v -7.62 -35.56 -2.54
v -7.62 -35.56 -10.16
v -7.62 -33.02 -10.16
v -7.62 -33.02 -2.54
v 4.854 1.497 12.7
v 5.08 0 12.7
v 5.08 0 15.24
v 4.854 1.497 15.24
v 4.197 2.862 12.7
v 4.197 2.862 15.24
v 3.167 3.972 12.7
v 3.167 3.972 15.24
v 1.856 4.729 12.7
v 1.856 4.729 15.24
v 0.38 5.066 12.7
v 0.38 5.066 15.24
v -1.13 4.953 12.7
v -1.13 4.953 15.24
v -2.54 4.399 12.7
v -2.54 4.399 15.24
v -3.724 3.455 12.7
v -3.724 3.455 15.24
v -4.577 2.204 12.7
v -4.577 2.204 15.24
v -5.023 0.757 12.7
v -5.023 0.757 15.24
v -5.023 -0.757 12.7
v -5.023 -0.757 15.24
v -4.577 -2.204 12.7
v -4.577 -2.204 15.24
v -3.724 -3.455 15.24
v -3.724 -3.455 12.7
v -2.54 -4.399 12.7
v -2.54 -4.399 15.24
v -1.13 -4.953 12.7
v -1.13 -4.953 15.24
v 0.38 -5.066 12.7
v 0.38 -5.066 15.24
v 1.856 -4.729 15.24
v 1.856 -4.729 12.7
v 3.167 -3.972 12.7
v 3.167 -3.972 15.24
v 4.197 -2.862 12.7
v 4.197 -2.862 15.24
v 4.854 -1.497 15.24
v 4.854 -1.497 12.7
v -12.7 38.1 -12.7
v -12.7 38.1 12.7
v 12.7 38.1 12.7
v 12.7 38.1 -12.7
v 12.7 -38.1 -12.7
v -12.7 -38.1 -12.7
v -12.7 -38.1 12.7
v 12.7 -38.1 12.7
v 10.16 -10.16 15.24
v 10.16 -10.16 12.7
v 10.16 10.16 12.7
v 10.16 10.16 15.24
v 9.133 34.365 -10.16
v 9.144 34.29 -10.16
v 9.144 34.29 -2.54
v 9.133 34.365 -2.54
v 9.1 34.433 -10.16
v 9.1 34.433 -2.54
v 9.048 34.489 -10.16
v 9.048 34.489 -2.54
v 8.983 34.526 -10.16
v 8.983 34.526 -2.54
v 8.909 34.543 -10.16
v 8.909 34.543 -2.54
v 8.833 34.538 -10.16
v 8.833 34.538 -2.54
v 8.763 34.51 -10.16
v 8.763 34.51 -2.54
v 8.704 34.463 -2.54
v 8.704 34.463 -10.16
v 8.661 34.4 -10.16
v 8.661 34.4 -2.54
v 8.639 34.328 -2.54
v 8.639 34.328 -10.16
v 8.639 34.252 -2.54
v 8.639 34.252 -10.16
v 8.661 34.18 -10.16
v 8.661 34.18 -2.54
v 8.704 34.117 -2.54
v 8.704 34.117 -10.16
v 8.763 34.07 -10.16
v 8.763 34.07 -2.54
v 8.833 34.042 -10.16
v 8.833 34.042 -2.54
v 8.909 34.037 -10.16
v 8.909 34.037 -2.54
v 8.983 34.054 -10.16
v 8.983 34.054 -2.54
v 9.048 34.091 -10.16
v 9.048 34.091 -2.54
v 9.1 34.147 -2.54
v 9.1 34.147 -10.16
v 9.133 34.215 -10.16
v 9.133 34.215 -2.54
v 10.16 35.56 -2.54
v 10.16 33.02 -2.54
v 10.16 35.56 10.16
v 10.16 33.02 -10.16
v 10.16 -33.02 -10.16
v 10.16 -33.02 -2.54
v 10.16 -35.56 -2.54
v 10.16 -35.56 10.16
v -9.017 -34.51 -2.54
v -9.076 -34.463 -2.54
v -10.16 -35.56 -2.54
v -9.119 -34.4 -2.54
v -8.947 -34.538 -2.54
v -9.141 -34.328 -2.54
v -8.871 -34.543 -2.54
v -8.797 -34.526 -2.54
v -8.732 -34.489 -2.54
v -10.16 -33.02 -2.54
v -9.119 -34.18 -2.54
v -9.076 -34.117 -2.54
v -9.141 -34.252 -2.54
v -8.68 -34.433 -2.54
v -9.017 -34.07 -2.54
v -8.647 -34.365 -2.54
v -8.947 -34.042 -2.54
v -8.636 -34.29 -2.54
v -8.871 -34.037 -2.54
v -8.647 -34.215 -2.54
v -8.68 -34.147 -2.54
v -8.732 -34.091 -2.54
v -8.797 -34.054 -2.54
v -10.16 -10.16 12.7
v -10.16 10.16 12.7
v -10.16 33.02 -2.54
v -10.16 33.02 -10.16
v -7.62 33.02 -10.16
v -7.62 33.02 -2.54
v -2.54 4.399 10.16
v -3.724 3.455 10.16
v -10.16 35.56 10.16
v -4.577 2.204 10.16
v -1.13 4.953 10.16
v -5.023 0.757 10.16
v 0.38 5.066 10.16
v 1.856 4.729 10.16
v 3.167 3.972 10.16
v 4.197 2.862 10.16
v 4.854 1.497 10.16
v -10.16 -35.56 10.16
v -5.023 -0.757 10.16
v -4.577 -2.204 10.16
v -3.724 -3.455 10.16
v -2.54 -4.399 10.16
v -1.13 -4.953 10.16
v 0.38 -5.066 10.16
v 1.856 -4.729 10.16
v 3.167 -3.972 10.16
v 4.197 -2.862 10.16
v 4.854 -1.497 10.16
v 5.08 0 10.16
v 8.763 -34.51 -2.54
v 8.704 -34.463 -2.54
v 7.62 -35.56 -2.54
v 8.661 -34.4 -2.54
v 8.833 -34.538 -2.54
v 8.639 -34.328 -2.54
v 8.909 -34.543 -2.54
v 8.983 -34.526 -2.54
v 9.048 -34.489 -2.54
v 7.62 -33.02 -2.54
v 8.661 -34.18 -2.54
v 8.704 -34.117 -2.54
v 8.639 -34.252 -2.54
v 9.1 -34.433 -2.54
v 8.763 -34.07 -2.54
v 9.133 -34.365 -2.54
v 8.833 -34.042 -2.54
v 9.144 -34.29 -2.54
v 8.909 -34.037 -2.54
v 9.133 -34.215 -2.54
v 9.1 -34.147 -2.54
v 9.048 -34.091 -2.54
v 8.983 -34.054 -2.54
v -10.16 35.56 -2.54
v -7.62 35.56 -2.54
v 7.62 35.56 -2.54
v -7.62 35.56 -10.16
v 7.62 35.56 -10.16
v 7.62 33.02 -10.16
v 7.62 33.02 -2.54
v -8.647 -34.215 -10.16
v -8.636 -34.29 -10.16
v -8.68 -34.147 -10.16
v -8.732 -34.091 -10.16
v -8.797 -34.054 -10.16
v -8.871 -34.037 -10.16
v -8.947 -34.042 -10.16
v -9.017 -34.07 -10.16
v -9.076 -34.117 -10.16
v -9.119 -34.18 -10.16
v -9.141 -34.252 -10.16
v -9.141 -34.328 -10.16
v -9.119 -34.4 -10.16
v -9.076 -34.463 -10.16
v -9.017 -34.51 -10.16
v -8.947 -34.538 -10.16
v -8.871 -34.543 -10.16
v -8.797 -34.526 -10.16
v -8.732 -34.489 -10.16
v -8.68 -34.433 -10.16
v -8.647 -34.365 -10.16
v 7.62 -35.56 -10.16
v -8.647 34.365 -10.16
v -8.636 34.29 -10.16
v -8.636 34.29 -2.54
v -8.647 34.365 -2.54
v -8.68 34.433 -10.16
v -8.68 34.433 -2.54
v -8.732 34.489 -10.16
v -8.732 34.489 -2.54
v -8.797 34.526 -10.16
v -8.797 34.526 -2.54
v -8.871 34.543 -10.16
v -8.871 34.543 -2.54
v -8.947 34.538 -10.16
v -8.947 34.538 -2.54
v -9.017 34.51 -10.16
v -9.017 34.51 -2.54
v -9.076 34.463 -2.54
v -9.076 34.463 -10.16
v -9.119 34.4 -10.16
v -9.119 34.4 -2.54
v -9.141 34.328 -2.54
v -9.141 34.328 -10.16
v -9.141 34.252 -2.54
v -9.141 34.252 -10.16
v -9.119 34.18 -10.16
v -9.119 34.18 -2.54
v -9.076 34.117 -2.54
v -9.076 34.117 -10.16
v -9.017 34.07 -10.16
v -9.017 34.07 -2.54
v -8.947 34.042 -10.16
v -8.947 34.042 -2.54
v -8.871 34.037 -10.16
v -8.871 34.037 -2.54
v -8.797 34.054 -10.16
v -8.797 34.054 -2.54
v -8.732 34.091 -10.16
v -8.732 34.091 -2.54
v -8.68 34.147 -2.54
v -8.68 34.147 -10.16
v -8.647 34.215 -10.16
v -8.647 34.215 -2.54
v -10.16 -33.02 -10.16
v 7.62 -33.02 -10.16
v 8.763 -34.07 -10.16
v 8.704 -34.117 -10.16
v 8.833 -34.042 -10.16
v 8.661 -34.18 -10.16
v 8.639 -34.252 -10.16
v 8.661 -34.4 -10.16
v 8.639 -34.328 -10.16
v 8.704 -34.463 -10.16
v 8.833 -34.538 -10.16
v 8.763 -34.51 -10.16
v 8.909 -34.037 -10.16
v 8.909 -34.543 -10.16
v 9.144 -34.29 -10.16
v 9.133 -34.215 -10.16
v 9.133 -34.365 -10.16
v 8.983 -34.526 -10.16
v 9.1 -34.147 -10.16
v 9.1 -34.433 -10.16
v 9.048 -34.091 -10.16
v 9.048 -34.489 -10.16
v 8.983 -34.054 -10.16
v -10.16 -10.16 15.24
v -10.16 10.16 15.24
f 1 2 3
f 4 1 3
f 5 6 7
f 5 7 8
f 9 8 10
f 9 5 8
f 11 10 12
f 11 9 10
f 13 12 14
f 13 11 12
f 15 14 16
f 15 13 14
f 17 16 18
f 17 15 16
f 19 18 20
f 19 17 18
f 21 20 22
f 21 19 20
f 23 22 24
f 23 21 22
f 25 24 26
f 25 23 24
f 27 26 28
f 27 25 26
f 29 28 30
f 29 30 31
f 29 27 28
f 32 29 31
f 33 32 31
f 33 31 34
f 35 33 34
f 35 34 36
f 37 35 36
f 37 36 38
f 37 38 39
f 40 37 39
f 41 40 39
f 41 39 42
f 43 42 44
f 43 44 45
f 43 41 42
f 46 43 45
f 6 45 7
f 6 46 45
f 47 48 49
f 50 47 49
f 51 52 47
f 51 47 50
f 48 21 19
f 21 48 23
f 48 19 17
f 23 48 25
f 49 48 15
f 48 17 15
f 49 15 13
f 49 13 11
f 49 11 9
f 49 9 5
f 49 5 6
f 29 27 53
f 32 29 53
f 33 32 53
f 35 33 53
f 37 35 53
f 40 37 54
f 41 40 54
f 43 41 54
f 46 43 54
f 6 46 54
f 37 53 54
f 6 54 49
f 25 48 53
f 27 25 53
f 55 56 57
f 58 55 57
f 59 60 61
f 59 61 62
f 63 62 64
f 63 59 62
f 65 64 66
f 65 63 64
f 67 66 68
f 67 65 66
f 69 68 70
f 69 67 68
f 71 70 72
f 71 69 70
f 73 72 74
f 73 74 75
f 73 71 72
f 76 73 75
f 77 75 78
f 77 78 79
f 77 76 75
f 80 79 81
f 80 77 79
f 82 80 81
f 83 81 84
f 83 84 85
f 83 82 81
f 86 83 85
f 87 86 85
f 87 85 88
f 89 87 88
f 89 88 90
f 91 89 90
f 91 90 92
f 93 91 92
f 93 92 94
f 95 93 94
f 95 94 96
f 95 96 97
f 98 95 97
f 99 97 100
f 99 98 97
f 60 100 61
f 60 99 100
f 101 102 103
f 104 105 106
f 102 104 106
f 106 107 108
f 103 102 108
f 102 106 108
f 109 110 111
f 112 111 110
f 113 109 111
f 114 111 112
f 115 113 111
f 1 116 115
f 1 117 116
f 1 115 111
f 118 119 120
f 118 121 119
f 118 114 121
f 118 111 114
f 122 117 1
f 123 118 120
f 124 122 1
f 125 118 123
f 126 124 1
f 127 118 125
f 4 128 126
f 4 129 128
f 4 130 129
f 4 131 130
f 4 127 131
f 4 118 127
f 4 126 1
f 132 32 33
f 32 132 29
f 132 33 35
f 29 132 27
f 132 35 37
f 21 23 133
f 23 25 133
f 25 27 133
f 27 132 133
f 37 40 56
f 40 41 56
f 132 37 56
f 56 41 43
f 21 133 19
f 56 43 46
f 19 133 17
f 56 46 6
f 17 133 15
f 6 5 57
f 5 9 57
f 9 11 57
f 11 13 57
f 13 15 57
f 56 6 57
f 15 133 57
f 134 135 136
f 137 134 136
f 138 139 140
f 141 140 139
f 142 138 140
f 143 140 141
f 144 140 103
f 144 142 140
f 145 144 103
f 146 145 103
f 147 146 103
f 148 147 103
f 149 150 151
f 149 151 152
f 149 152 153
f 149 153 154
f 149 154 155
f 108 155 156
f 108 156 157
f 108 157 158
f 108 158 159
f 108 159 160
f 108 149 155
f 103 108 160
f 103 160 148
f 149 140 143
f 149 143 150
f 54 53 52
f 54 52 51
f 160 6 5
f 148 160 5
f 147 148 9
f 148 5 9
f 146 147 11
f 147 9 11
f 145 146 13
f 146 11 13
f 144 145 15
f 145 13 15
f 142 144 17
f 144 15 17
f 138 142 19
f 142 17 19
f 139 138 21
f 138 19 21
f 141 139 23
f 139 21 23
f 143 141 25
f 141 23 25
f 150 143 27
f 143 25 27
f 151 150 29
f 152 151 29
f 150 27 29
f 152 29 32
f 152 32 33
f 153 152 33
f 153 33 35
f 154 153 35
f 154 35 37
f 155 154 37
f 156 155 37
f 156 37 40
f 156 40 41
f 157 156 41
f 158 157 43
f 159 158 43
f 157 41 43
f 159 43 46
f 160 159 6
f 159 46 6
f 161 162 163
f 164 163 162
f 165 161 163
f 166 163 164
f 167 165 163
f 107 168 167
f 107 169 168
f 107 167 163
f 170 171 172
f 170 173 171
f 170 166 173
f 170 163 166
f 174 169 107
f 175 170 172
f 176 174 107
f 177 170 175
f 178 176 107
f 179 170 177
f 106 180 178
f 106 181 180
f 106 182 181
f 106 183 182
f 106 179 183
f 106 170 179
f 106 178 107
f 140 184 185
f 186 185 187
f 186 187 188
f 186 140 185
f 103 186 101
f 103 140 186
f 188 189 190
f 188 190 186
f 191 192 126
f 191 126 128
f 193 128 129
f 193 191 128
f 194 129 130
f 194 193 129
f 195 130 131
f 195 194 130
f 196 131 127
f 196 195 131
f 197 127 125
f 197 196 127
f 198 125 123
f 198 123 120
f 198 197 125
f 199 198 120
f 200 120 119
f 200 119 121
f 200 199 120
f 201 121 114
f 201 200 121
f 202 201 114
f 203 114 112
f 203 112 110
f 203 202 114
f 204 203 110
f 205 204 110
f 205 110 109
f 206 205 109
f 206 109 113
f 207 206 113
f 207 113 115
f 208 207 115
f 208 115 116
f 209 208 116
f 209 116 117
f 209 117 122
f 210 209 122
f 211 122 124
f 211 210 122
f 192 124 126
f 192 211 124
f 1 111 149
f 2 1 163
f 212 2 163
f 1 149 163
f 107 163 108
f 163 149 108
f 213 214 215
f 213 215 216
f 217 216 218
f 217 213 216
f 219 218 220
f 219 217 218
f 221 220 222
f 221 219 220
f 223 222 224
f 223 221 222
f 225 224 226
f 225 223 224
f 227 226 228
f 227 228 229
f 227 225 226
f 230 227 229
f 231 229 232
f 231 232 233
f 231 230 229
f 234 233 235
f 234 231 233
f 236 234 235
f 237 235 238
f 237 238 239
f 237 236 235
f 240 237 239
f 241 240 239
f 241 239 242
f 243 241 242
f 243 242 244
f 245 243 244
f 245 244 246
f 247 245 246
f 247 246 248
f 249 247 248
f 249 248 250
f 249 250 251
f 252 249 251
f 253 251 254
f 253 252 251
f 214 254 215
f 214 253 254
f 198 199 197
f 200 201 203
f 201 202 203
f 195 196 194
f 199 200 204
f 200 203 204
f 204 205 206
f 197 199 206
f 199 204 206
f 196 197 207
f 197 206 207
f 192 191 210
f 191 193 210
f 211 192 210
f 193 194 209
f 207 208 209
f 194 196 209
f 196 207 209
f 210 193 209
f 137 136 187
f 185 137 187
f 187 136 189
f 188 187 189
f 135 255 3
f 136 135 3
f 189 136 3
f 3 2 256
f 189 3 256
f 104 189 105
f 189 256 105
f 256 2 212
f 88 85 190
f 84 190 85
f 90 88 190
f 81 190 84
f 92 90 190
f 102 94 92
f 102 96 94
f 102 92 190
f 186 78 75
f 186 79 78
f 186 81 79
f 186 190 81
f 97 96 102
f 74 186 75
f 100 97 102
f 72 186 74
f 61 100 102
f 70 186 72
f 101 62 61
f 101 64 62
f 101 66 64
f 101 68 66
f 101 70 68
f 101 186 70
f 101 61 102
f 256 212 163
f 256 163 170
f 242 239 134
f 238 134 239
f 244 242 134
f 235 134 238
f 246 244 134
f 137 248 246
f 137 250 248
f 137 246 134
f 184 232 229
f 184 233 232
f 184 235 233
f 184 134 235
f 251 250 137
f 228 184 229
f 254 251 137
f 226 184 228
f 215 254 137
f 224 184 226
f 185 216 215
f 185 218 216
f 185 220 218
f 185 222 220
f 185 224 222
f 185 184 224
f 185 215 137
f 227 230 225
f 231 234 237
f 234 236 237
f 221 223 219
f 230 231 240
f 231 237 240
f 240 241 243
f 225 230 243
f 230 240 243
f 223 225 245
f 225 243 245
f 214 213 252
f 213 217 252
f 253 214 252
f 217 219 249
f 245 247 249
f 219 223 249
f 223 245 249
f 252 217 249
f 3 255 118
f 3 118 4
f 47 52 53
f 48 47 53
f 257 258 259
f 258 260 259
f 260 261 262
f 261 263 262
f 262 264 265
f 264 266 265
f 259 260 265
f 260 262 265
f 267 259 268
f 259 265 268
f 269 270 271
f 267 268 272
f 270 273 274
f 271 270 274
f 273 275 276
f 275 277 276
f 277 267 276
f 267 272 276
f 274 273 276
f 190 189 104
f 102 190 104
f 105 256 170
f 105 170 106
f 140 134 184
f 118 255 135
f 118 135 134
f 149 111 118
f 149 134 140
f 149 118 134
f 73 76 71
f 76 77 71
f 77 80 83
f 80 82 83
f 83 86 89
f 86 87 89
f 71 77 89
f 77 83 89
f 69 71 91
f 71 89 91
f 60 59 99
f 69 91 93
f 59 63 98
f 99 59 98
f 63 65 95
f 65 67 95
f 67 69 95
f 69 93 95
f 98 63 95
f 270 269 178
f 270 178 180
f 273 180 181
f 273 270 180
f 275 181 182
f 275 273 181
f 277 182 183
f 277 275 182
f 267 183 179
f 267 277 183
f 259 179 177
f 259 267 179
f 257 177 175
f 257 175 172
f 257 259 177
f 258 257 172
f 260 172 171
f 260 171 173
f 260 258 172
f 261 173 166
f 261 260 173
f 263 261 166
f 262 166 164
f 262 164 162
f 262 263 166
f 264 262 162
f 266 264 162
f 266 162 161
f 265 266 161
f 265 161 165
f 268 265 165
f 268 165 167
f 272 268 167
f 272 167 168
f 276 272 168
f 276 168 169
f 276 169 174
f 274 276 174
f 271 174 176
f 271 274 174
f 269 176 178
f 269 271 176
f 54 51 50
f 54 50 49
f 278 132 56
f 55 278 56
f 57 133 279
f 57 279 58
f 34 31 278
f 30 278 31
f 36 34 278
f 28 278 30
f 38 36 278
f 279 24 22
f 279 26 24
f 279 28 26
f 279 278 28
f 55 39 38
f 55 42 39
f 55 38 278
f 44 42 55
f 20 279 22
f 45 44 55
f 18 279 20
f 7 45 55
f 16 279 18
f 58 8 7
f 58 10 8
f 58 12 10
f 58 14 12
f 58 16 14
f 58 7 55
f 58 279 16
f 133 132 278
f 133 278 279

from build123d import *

# Parameters (mm, degrees)
F0_W     = 25.4
F0_H     = 25.4
F1_DEPTH = 38.1
F2_T     = -2.54
F3_R     = 5.08
F4_DEPTH = 2.54
F3_W     = 20.32
F3_H     = 20.32
F5_DEPTH = 2.54
F6_W     = 2.54
F6_H     = 2.54
F6_R     = 0.254
F7_DEPTH = 7.62


with BuildPart() as f1:
    # F0 (on Front) → F1 (new body, symmetric)
    with BuildSketch(Plane.XZ):
        Rectangle(F0_W, F0_H)
    extrude(amount=F1_DEPTH, both=True)

    # F2 (hollow: no face is removed)
    offset(amount=F2_T, mode=Mode.SUBTRACT)

    # F3 (on face) → F4 (cut)
    with BuildSketch(Plane.XY.offset(12.7)):
        Circle(F3_R)
    extrude(amount=-F4_DEPTH, mode=Mode.SUBTRACT)

    # F6 (on face) → F7 (join)
    with BuildSketch(Plane.XY.offset(-10.16)):
        with Locations((-8.89, 34.29)):
            Rectangle(F6_W, F6_H)
        with Locations((-8.89, 34.29)):
            Circle(F6_R, mode=Mode.SUBTRACT)
        with Locations((8.89, 34.29)):
            Rectangle(F6_W, F6_H)
        with Locations((8.89, 34.29)):
            Circle(F6_R, mode=Mode.SUBTRACT)
        with Locations((8.89, -34.29)):
            Rectangle(F6_W, F6_H)
        with Locations((8.89, -34.29)):
            Circle(F6_R, mode=Mode.SUBTRACT)
        with Locations((-8.89, -34.29)):
            Rectangle(F6_W, F6_H)
        with Locations((-8.89, -34.29)):
            Circle(F6_R, mode=Mode.SUBTRACT)
    extrude(amount=F7_DEPTH)


with BuildPart() as f5:
    # F3 (on face) → F5 (new body)
    with BuildSketch(Plane.XY.offset(12.7)):
        Rectangle(F3_W, F3_H)
        Circle(F3_R, mode=Mode.SUBTRACT)
    extrude(amount=F5_DEPTH)


solid = Compound([f1.part, f5.part])
